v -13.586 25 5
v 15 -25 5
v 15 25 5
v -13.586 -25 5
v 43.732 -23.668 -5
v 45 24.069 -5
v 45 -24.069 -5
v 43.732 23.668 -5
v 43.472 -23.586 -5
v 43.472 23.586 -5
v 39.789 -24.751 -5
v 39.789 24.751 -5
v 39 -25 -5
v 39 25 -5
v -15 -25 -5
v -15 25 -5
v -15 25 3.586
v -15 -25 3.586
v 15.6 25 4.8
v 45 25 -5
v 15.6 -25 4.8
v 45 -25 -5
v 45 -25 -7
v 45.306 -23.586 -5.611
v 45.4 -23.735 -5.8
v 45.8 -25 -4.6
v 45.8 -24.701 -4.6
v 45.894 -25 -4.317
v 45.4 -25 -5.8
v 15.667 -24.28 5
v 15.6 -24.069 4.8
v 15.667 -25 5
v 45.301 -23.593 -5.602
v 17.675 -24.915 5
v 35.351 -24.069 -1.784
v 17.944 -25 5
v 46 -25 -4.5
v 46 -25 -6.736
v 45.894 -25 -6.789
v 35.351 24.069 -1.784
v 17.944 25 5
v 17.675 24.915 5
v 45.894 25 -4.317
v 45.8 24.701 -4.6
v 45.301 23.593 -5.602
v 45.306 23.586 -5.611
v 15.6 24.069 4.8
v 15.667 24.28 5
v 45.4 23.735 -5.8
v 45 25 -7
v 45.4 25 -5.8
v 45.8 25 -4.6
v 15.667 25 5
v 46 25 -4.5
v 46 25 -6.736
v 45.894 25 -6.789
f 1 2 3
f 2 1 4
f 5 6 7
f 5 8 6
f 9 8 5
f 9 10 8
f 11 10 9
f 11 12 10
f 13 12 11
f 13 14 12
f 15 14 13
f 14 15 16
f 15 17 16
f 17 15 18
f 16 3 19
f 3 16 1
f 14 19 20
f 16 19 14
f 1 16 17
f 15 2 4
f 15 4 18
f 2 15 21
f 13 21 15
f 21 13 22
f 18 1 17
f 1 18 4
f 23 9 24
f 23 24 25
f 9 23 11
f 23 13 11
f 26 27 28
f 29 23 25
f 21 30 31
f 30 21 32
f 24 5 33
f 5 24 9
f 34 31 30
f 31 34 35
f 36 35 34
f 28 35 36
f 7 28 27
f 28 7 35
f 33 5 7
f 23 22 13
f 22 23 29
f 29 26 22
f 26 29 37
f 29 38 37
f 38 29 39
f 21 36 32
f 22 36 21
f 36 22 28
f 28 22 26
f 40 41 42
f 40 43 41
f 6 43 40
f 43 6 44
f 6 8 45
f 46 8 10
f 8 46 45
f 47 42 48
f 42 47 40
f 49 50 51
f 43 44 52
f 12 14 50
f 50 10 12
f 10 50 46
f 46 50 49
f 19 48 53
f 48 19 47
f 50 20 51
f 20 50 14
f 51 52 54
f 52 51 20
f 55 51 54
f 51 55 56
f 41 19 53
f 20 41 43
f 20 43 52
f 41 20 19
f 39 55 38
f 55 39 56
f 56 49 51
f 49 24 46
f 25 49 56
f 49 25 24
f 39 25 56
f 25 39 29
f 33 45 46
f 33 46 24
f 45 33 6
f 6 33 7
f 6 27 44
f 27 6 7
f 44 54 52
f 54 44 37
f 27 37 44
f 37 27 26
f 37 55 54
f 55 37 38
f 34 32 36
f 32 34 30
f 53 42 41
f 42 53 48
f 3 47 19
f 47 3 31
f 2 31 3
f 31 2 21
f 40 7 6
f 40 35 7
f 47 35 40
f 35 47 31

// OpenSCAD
// Charger tray with wedge
module charger_tray(height, width, tray_length, wedge_length, chamfer) {
    difference() {
        // Main charger tray body
        cube([tray_length, width, height], center=true);
        // Chamfered edge on the side opposite the wedge
        translate([-tray_length/2, 0, height/2])
        rotate([0, 45, 0])
        cube([chamfer, width, chamfer], center=true);
    }
    
    // Wedge
    translate([tray_length/2, 0, -height/2])
    rotate([90, 0, 0])
    wedge(wedge_length, width, height, chamfer);
}

// Wedge for the charger tray
module wedge(length, width, height, chamfer) {
    linear_extrude(height = width, center = true)
    polygon([
        [0, height],
        [length, 0],
        [0, 0],
    ]);

    wedge_angle = atan(length / height);
    wedge_hypotenuse = sqrt(length * length + height * height);

    // Edge blends
    difference() {
        union() {
            difference() {
            translate([length, -chamfer, width/2])
            rotate([0, 45, wedge_angle])
            cube([chamfer, wedge_hypotenuse, chamfer]);
            translate([length, -chamfer, width/2])
            rotate([0, 0, wedge_angle])
                cube([chamfer*2, wedge_hypotenuse+2, chamfer]);
            }

            difference() {
            translate([length, -chamfer, -width/2])
            rotate([0, 45, wedge_angle])
            cube([chamfer, wedge_hypotenuse, chamfer]);
            translate([length, -chamfer, -width/2-chamfer])
            rotate([0, 0, wedge_angle])
                cube([chamfer*2, wedge_hypotenuse+2, chamfer]);
            }

            difference() {
            translate([length, 0, -width/2])
            rotate([90, 0, wedge_angle-45])
            cube([chamfer, width, chamfer]);
            translate([length+chamfer/2, chamfer, -width/2])
            rotate([90, 0, 0])
            cube([chamfer, width, chamfer*2]);
            }
        }
    translate([0, height+chamfer, -width/2])
    rotate([90, 0, 0])
    cube([chamfer*2, width, chamfer]);
}
}

charger_tray(10, 50, 30, 30, 2);
